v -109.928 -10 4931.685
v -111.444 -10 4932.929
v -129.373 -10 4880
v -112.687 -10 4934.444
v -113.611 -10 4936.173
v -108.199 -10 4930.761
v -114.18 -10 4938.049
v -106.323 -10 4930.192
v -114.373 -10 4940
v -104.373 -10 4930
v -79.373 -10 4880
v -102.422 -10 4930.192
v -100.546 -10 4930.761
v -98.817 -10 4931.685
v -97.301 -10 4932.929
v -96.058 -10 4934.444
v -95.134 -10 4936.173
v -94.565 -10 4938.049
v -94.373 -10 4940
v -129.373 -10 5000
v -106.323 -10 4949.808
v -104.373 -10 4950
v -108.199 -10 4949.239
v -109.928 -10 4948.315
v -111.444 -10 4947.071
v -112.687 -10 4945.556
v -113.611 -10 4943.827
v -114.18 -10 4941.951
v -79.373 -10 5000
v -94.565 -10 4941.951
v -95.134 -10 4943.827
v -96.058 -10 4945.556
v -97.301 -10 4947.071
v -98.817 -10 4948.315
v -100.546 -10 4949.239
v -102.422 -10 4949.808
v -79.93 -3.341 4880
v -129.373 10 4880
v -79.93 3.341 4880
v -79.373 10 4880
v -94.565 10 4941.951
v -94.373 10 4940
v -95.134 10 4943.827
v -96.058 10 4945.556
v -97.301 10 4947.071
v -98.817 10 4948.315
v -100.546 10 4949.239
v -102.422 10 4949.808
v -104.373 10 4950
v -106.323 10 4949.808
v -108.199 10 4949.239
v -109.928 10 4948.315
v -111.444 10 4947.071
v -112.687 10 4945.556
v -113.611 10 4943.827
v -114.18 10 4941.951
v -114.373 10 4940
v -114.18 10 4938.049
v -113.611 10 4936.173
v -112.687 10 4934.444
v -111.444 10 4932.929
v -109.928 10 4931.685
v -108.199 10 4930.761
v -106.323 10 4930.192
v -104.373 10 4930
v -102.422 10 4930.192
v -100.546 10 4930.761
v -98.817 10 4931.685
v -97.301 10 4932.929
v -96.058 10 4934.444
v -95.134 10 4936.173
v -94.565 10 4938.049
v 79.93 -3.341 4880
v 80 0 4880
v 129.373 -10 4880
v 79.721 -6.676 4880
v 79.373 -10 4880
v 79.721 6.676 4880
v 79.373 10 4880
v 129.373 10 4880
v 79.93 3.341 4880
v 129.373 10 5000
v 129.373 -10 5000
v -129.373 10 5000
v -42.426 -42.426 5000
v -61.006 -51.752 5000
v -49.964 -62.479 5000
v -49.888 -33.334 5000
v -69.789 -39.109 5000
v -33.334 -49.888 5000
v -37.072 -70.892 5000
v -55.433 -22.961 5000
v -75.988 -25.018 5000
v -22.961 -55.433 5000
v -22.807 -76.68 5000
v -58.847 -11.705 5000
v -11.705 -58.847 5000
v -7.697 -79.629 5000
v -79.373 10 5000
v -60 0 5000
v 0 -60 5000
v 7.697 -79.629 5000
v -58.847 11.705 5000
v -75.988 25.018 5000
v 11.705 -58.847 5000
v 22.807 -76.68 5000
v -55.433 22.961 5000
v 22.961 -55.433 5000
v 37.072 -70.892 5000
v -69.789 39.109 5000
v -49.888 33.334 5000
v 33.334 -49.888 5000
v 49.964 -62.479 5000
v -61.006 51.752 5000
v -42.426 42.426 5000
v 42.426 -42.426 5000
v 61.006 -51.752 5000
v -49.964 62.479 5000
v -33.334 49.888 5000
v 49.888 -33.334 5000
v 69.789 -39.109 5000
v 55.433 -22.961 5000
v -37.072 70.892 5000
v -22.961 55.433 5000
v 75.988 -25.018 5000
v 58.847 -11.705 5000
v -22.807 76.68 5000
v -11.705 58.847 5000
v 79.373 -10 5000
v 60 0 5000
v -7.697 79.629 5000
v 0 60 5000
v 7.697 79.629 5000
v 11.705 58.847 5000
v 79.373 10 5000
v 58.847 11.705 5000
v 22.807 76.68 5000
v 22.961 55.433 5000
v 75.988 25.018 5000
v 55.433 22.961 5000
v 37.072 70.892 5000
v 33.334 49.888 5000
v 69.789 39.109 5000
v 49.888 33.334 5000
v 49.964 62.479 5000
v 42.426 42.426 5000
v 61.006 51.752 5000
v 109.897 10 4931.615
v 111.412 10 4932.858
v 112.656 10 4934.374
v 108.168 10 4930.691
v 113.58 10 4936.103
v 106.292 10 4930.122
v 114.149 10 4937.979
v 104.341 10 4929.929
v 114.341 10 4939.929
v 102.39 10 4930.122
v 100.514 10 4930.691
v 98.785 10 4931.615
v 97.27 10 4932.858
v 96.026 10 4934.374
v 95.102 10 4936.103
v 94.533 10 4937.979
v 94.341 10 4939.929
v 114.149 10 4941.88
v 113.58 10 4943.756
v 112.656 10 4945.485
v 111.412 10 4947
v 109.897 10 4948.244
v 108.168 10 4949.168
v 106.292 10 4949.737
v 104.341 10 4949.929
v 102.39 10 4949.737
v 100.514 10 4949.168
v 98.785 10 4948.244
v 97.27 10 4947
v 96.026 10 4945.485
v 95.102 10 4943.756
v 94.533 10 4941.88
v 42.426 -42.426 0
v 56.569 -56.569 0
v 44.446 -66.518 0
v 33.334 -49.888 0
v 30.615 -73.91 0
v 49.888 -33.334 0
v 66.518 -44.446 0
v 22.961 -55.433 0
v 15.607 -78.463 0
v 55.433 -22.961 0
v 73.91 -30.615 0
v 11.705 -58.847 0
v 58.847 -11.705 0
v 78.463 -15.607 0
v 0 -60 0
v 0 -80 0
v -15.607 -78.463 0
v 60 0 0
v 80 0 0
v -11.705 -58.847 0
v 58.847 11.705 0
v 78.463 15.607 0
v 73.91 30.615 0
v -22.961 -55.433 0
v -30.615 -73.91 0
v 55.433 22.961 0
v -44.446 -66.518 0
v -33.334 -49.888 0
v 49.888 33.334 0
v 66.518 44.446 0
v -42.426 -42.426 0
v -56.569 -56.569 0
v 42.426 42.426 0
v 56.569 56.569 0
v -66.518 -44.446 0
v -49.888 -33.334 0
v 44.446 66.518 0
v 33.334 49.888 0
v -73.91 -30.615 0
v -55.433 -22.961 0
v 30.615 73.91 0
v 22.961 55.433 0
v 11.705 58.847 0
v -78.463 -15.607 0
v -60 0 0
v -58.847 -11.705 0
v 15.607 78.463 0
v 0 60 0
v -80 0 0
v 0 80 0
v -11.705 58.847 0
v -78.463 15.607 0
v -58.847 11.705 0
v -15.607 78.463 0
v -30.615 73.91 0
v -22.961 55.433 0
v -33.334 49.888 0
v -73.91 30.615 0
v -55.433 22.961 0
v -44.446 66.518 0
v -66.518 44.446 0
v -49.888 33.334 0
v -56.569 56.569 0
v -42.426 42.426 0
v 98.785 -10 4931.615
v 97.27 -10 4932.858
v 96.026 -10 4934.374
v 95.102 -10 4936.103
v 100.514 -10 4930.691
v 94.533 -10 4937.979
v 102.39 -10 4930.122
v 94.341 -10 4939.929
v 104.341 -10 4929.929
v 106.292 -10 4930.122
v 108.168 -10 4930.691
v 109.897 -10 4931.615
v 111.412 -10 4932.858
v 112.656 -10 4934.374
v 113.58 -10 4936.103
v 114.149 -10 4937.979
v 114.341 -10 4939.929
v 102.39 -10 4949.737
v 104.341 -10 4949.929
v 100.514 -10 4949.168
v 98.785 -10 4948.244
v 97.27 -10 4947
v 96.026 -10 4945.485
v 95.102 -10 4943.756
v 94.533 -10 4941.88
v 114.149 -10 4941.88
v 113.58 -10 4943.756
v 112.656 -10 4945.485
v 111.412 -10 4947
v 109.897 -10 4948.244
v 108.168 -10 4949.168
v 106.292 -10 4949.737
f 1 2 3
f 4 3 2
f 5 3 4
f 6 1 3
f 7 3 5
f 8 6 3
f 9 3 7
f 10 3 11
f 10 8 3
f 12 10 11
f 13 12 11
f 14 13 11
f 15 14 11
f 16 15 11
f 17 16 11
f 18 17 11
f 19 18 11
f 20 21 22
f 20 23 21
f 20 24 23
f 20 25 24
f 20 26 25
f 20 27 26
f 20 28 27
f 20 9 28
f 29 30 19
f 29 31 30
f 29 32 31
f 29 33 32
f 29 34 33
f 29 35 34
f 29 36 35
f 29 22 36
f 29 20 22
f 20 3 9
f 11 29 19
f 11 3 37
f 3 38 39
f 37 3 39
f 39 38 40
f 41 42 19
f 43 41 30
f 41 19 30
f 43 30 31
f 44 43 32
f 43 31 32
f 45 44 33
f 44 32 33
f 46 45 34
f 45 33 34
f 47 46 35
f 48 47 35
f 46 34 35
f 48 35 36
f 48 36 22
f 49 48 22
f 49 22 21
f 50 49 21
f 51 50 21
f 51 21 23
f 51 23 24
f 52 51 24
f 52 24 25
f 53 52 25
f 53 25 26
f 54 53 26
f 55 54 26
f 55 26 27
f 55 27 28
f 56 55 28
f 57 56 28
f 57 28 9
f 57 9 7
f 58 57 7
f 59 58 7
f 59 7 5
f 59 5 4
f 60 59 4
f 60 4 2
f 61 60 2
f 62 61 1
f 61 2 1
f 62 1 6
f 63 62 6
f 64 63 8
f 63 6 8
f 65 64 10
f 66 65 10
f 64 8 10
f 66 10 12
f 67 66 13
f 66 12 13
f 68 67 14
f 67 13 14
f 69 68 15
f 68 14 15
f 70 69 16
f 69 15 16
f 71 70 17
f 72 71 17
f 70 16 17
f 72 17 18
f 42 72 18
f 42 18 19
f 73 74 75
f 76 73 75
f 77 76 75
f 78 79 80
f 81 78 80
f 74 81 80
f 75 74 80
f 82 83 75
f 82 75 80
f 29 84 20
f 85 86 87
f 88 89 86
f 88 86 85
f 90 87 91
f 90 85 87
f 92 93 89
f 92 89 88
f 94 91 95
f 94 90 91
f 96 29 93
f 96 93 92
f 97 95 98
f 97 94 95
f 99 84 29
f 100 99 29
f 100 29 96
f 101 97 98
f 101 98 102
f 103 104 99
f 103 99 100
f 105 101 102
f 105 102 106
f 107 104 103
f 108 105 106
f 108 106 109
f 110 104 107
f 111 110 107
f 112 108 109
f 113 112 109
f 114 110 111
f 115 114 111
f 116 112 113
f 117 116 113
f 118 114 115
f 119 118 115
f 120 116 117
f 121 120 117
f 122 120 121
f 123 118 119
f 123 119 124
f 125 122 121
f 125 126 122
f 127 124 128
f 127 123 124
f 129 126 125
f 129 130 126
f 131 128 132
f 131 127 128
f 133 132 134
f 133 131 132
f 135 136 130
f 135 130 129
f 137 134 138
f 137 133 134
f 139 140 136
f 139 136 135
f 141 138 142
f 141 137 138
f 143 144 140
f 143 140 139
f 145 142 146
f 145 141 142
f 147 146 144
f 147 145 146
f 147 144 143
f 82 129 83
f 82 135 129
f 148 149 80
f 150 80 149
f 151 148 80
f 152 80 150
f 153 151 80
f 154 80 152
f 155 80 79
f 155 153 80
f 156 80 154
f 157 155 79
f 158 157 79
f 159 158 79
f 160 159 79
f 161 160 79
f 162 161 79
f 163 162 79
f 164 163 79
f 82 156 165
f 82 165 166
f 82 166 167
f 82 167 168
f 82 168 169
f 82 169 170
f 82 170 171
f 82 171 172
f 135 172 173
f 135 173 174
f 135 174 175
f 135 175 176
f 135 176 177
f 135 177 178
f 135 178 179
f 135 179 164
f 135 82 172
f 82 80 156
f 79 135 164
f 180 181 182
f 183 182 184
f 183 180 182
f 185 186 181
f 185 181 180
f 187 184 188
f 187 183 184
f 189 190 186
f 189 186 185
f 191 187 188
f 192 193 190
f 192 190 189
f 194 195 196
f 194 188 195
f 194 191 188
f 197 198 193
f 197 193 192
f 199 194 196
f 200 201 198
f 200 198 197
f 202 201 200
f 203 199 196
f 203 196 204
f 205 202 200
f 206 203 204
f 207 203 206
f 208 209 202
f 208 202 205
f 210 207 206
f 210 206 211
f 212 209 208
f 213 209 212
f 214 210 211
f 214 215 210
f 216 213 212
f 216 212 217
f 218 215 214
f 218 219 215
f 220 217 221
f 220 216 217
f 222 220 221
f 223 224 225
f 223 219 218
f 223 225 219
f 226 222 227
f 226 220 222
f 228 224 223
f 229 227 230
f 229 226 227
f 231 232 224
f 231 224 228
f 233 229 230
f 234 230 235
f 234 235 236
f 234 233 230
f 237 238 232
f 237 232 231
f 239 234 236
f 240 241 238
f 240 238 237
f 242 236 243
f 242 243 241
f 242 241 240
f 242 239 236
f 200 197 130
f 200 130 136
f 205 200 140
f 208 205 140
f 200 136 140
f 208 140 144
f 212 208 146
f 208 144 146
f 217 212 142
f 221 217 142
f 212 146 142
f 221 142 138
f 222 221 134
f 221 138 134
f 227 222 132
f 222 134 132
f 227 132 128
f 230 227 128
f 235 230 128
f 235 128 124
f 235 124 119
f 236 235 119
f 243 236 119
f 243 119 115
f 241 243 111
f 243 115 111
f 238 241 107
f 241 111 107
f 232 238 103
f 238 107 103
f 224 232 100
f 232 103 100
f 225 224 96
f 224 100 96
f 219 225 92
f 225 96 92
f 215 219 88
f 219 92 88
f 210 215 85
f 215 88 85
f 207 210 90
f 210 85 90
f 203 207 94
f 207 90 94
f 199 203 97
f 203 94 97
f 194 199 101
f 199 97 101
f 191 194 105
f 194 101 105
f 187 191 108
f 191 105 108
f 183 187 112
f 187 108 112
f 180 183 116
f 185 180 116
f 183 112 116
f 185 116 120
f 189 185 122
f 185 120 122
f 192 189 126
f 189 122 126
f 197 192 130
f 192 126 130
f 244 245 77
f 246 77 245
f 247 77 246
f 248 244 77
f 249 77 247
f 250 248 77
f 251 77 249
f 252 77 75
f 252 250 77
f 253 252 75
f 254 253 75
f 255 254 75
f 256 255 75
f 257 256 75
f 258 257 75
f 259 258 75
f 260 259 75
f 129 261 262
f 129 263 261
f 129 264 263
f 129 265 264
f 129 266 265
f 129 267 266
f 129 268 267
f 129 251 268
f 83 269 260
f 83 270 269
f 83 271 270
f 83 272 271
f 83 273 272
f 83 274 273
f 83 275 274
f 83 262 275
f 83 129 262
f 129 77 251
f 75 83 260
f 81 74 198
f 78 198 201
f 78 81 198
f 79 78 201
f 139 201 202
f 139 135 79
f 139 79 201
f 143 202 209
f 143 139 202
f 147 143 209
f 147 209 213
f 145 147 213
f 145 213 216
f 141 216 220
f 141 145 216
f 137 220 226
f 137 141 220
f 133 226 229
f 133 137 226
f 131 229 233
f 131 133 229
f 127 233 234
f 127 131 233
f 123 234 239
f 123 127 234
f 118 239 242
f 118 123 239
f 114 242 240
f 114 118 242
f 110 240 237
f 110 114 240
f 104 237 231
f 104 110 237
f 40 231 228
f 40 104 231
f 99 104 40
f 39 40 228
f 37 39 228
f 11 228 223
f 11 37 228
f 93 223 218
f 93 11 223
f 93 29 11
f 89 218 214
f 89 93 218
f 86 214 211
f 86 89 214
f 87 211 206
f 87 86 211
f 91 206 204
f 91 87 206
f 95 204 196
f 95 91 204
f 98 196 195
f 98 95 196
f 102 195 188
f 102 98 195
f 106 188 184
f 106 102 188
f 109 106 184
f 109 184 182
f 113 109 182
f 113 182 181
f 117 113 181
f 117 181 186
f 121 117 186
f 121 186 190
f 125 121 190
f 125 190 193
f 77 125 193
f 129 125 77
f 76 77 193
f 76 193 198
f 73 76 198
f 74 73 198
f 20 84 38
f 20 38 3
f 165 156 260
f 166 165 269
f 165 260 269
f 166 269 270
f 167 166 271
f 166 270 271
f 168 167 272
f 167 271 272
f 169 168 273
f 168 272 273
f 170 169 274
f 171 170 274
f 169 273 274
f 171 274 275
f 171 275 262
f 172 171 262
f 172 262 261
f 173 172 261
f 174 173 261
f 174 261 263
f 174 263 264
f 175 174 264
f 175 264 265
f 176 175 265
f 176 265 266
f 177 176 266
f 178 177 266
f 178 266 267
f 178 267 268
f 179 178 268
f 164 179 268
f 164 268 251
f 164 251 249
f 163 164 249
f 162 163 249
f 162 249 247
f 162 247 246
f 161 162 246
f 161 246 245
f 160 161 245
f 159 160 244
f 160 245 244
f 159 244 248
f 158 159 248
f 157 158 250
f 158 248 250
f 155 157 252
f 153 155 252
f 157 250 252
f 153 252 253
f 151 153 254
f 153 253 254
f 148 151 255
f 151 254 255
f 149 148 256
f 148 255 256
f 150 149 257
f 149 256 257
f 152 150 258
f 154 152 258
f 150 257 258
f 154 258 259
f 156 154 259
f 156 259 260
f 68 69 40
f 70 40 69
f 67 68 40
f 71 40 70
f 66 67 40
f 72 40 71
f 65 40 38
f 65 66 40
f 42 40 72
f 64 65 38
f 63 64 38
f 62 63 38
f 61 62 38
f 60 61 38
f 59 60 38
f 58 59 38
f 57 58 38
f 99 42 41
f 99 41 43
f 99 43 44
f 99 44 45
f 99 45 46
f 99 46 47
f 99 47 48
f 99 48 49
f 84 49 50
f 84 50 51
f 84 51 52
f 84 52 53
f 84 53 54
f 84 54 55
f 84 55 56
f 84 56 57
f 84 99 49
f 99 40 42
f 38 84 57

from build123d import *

# Parameters (mm, degrees)
F0_W     = 20
F0_H     = 5000
F3_DEPTH = 120
F4_R     = 10
F5_DEPTH = 25


with BuildPart() as f1:
    # F0 (on Front) → F1 (revolve)
    with BuildSketch(Plane.XZ):
        with Locations((70, 2500)):
            Rectangle(F0_W, F0_H)
    revolve(axis=Axis((0, 0, 2500), (0, 0, 1)))

    # F2 (on face) → F3 (join)
    with BuildSketch(Plane.XY.offset(5000)):
        with BuildLine():
            ThreePointArc((-79.372539, -10), (-80, 0), (-79.372539, 10))
            Line((-79.372539, 10), (-129.372539, 10))
            Line((-129.372539, 10), (-129.372539, -10))
            Line((-129.372539, -10), (-79.372539, -10))
        make_face()
        with BuildLine():
            Line((129.372539, 10), (79.372539, 10))
            ThreePointArc((79.372539, 10), (79.842981, 5.009833), (80, 0))
            ThreePointArc((80, 0), (79.842981, -5.009833), (79.372539, -10))
            Line((79.372539, -10), (129.372539, -10))
            Line((129.372539, -10), (129.372539, 10))
        make_face()
    extrude(amount=-F3_DEPTH)

    # F4 (on face) → F5 (cut)
    with BuildSketch(Plane.XZ.offset(10)):
        with Locations((-104.372539, 4940)):
            Circle(F4_R)
        with Locations((104.341069, 4939.929428)):
            Circle(F4_R)
    extrude(amount=-F5_DEPTH, mode=Mode.SUBTRACT)


solid = f1.part
